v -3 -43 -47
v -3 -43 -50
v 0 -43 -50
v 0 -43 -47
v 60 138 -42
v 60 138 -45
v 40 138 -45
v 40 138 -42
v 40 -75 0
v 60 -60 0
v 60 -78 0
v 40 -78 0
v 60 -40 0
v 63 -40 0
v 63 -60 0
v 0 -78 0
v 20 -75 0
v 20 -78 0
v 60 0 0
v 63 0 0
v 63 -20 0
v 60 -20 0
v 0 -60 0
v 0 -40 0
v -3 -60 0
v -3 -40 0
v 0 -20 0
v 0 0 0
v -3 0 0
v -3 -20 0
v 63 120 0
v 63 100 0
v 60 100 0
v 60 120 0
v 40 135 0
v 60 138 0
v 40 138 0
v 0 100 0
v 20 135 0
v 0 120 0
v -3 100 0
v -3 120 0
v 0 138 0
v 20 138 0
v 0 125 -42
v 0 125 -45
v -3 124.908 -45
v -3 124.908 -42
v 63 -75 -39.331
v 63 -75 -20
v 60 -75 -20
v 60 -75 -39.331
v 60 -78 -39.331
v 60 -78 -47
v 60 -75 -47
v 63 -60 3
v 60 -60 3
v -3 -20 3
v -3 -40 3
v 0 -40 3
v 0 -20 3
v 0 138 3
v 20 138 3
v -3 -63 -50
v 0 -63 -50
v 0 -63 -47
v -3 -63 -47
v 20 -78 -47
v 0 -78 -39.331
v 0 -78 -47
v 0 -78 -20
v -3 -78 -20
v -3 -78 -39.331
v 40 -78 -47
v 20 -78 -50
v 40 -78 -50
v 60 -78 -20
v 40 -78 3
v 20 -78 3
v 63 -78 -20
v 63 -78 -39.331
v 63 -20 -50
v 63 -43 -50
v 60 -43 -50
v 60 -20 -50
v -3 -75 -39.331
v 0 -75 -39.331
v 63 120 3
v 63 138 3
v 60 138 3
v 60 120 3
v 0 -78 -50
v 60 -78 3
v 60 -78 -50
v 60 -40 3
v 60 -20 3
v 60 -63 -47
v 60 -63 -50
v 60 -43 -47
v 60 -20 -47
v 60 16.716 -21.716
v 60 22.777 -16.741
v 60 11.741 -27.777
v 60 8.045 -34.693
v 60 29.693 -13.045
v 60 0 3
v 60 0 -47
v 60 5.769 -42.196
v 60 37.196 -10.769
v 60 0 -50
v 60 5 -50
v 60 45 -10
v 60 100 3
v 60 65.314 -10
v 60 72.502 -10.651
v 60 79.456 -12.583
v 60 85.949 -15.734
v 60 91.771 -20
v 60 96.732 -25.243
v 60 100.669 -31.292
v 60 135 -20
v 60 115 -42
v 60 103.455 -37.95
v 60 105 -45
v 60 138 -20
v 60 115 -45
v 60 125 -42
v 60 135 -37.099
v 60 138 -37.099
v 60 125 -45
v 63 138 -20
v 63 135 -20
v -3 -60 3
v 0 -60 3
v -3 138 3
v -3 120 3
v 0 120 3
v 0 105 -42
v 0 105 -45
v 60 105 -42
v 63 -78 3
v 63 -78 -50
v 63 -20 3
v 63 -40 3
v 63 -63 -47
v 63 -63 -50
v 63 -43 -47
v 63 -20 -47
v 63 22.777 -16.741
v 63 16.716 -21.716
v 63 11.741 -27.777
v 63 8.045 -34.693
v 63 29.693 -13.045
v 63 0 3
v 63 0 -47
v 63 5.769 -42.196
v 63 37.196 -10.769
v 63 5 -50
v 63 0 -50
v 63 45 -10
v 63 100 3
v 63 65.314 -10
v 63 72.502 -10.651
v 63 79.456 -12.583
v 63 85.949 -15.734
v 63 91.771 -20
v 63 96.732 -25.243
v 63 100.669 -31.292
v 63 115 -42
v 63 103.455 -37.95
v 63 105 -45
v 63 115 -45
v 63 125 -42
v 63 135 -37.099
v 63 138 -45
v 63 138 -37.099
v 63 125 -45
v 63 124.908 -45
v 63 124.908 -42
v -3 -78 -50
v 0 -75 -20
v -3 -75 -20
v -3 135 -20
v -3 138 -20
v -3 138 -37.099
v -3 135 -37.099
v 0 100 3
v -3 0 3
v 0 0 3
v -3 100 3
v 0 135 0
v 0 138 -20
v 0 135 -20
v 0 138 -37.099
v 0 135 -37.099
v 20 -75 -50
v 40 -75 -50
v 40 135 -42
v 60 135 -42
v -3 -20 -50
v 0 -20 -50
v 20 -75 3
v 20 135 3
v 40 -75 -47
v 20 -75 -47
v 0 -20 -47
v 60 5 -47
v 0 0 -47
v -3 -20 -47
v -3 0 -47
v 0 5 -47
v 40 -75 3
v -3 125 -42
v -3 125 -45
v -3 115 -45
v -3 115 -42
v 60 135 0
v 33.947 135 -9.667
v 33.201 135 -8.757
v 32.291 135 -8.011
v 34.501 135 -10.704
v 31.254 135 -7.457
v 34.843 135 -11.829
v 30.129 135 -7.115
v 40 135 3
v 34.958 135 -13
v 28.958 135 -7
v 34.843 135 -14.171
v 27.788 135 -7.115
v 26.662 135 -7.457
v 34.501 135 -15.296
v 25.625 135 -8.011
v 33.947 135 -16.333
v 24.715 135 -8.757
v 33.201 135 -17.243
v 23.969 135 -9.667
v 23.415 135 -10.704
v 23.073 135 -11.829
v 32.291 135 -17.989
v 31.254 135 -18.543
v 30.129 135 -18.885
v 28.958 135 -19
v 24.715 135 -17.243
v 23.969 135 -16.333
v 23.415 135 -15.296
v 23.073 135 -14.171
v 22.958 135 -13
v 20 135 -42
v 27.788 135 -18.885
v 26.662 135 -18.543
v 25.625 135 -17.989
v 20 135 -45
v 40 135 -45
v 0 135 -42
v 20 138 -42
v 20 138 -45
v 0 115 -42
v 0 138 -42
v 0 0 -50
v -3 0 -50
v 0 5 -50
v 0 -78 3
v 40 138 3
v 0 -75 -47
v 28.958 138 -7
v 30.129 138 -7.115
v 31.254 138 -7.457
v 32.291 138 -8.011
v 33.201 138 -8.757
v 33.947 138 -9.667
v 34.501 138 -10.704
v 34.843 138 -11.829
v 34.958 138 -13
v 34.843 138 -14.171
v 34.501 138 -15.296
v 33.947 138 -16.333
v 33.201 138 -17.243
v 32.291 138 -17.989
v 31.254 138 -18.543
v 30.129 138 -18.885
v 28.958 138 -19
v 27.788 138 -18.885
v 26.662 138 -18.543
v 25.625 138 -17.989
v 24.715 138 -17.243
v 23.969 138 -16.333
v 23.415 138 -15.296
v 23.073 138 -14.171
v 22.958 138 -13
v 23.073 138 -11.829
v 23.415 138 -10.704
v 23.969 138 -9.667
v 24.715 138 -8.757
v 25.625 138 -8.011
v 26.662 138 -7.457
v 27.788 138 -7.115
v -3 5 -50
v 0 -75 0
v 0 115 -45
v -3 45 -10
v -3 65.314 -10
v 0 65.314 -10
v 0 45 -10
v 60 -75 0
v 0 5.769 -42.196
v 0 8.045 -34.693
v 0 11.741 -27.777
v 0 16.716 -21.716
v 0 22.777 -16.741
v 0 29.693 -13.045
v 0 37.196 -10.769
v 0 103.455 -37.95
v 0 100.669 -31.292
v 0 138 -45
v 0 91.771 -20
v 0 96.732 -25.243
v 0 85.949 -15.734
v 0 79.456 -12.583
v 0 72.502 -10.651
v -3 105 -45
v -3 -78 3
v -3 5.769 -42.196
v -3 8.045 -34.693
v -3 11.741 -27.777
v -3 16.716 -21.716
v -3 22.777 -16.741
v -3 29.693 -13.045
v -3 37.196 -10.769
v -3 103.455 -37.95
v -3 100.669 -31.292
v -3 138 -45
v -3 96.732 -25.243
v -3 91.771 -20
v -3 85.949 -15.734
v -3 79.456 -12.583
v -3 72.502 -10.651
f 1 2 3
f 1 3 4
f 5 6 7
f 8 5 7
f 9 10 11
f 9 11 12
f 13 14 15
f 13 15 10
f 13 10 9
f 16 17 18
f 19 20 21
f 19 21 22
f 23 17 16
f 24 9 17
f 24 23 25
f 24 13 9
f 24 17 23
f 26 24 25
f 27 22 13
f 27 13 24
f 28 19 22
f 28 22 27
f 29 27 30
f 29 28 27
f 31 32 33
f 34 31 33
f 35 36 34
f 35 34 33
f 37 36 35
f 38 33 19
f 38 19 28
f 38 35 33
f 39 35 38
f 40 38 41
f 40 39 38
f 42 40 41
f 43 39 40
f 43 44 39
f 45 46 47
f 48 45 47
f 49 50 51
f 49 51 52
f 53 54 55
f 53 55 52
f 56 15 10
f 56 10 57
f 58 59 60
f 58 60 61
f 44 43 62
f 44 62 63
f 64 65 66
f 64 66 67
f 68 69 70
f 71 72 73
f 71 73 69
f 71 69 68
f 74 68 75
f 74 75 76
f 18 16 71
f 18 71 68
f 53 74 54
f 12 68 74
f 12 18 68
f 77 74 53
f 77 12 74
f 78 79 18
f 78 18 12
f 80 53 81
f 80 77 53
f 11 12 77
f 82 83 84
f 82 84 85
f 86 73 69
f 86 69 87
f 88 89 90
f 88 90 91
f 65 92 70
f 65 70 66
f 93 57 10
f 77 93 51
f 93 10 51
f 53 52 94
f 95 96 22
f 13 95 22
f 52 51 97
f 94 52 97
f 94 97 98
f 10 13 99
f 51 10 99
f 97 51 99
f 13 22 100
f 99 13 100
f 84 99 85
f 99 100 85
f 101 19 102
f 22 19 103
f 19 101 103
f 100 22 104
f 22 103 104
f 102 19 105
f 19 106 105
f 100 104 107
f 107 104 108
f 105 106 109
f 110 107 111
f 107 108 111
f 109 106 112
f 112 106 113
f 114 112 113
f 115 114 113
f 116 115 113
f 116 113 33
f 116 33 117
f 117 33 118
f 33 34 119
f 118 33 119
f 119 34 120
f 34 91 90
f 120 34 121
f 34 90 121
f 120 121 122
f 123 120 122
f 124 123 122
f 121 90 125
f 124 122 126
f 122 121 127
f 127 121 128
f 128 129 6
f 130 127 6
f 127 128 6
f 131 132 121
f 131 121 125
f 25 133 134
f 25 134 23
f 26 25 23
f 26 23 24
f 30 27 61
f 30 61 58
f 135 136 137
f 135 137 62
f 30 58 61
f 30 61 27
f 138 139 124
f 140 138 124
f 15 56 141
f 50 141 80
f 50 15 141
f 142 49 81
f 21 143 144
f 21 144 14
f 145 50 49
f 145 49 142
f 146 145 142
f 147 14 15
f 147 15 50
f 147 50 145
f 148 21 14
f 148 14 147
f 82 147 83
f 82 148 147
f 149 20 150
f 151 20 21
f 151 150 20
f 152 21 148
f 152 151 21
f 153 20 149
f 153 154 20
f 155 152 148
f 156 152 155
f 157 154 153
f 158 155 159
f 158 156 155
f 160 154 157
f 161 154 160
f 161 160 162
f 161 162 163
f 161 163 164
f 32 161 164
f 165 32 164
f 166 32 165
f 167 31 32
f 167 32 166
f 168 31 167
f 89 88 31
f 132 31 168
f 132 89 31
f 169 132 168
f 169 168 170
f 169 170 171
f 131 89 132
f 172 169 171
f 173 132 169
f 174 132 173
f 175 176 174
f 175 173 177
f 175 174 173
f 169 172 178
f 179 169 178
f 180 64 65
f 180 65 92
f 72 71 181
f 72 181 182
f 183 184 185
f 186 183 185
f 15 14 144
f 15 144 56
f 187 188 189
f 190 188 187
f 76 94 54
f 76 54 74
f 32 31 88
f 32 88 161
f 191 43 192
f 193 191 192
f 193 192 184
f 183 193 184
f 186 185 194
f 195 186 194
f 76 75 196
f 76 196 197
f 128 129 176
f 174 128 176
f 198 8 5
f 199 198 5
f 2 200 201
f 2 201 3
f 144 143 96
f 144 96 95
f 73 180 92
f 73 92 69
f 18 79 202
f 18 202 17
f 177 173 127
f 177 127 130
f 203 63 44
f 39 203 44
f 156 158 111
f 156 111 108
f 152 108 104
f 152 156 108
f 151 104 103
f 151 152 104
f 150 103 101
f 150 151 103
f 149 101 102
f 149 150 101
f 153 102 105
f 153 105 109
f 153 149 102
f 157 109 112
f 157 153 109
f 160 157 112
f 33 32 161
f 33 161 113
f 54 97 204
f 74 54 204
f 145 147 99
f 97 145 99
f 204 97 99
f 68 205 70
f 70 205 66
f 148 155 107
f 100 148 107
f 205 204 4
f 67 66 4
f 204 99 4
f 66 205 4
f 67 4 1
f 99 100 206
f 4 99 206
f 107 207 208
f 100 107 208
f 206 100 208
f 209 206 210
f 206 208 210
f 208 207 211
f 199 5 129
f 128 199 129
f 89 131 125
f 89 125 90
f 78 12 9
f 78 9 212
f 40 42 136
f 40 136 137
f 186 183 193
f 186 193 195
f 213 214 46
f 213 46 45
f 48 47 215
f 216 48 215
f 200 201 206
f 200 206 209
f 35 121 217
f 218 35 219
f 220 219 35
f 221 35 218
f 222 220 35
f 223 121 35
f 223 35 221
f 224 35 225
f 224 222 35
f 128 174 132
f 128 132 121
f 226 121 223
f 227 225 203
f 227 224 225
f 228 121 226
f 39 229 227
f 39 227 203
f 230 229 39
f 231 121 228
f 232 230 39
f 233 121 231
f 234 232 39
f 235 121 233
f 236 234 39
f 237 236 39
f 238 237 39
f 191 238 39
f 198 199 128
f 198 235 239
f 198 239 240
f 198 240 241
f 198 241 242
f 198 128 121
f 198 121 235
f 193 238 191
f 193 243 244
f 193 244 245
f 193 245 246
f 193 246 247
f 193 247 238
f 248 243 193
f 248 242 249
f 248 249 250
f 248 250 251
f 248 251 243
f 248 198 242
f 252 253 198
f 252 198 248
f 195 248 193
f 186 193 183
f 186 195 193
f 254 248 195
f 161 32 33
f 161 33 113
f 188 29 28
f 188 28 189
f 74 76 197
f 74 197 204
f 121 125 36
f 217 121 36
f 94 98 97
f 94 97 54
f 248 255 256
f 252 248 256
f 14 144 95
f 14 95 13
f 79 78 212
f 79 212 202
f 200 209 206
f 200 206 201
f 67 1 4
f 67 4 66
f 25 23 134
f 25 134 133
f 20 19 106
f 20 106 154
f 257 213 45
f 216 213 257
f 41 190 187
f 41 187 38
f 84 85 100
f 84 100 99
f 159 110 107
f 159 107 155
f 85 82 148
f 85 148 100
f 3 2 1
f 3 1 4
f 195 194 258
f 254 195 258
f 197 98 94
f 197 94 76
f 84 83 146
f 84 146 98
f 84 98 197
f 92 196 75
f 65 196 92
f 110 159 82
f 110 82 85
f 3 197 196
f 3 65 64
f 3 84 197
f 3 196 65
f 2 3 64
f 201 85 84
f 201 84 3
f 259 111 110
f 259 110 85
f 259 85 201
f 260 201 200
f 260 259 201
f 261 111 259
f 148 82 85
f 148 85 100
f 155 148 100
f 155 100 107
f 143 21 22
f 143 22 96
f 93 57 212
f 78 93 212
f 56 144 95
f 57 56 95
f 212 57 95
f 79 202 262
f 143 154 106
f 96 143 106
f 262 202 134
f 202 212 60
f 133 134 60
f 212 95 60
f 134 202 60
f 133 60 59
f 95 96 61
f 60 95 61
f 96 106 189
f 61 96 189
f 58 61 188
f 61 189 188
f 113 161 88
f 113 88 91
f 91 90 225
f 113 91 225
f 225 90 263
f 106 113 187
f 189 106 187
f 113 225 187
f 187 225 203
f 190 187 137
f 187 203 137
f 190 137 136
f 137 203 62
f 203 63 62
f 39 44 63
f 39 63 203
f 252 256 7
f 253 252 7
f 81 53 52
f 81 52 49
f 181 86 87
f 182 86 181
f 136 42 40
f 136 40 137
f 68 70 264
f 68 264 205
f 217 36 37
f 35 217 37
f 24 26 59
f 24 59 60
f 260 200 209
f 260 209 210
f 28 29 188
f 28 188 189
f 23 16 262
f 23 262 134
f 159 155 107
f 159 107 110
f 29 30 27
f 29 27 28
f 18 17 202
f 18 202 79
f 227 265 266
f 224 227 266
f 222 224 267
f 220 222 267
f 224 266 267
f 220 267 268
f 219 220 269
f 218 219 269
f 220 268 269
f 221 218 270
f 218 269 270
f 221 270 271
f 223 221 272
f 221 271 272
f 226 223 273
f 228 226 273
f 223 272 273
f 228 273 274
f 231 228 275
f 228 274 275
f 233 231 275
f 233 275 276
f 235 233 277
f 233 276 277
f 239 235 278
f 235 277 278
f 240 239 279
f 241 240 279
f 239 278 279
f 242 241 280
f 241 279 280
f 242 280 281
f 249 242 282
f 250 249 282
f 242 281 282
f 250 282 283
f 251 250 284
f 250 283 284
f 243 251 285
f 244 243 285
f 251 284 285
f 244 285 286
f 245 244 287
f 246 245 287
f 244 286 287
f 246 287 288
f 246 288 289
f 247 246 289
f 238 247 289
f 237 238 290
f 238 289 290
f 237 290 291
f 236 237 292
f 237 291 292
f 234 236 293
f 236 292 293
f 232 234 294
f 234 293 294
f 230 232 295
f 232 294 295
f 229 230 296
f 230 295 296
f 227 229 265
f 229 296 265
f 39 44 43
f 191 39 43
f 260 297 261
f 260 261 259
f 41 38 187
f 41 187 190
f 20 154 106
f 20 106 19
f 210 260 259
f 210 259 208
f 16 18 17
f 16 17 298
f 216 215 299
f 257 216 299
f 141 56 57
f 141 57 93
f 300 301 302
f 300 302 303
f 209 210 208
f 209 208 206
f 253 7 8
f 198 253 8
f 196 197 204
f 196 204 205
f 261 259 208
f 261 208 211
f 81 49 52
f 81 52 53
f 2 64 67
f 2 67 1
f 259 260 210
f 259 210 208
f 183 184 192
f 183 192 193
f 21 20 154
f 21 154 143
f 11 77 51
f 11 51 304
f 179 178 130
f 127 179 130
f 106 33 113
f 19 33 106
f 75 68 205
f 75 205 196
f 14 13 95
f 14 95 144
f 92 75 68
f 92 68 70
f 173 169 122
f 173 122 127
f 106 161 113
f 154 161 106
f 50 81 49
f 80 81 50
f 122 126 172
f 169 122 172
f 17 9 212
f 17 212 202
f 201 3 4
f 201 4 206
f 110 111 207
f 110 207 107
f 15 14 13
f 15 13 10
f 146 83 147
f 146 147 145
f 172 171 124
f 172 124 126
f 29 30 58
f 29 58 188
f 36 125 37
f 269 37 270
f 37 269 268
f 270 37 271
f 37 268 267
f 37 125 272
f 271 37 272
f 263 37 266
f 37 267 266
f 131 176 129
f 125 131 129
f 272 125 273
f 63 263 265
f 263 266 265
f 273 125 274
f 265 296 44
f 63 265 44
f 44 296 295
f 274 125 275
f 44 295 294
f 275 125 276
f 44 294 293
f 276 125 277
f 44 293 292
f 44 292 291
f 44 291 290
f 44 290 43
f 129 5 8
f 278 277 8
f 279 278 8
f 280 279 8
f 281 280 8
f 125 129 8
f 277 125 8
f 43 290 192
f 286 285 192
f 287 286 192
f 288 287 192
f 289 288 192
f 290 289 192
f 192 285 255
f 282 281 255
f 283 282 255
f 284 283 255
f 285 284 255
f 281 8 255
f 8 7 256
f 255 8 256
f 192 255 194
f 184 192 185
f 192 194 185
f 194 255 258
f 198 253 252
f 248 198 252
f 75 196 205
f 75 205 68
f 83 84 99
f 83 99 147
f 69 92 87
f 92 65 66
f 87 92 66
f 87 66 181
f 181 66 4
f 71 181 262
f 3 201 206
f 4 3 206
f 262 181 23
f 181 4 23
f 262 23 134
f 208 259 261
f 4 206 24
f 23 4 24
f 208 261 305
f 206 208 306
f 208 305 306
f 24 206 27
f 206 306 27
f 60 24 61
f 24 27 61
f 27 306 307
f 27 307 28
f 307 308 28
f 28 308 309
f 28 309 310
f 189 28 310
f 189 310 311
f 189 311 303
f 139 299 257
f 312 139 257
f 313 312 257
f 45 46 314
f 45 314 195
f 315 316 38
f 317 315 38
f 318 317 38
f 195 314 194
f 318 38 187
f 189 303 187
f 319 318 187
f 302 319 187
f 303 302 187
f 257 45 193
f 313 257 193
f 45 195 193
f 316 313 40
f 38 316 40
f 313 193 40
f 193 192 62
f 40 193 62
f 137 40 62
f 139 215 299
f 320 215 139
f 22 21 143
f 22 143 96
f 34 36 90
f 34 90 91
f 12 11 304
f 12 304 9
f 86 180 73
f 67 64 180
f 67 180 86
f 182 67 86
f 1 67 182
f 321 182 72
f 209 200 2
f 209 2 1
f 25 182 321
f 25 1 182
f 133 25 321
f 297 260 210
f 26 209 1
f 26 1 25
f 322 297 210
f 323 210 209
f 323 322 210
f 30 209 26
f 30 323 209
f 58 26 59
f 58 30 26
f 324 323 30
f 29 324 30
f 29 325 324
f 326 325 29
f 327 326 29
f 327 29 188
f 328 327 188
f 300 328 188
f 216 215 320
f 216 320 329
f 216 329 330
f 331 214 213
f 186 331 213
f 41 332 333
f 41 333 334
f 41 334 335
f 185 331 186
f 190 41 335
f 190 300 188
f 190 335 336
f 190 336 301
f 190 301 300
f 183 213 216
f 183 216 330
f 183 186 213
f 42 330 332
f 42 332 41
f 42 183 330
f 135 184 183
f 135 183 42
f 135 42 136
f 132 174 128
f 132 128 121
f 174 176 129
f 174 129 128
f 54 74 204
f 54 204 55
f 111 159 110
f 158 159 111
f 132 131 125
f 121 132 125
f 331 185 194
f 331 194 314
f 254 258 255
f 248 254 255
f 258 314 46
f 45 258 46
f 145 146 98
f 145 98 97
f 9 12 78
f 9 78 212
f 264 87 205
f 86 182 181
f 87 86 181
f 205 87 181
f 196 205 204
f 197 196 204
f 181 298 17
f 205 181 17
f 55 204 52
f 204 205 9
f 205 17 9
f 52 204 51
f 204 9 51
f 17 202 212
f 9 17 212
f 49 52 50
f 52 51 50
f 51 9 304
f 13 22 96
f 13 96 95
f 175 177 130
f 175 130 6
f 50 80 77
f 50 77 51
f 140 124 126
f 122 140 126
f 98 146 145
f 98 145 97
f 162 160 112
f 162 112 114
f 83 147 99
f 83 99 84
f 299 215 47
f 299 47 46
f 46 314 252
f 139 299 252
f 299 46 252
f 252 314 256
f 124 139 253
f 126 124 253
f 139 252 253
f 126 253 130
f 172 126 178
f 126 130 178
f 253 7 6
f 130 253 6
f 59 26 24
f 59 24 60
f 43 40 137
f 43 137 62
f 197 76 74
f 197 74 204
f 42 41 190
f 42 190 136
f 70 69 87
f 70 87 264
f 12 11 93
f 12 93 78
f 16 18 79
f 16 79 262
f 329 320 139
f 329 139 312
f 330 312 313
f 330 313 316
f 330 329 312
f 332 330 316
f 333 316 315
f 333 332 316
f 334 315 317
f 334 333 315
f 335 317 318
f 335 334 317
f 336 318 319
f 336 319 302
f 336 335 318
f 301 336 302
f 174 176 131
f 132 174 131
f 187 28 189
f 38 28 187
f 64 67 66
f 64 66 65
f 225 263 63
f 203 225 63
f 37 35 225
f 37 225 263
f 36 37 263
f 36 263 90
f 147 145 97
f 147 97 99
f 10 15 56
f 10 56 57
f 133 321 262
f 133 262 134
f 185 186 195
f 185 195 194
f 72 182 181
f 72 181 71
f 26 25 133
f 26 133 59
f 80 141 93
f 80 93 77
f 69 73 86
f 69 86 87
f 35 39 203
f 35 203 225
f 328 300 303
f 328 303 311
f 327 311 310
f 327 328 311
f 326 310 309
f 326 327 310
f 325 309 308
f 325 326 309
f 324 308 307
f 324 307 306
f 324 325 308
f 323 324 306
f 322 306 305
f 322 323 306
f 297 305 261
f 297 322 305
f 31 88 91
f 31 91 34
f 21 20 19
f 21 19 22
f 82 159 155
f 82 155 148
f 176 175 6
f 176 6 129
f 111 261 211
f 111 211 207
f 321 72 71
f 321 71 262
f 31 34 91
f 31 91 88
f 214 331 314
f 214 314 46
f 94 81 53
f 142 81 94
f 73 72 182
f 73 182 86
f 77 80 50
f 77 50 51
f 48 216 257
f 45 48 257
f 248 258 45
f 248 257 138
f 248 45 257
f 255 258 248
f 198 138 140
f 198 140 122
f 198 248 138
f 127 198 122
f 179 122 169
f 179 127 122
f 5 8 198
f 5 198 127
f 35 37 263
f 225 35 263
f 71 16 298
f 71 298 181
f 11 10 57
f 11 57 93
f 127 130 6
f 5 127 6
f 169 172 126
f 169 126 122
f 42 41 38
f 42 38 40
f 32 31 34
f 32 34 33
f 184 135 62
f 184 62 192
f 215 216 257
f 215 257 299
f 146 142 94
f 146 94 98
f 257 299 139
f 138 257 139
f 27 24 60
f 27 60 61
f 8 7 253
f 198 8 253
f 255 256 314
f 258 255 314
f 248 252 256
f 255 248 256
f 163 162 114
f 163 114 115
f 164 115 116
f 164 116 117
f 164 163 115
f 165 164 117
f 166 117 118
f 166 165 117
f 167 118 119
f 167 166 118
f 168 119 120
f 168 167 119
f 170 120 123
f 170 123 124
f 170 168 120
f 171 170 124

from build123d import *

# Parameters (mm, degrees)
BOSS_EXTRUDE1_DEPTH = 3
BOSS_EXTRUDE2_DEPTH = 3
SKETCH3_R           = 6
BOSS_EXTRUDE3_DEPTH = 3
BOSS_EXTRUDE4_DEPTH = 3
BOSS_EXTRUDE5_DEPTH = 3
BOSS_EXTRUDE6_DEPTH = 3
BOSS_EXTRUDE8_DEPTH = 3


with BuildPart() as part:
    # Sketch1 → Boss-Extrude1 (new body)
    with BuildSketch(Plane.XY):
        Polygon((0, 0), (0, 100), (-3, 100), (-3, 120), (0, 120), (0, 138), (20, 138), (20, 135), (40, 135), (40, 138), (60, 138), (60, 120), (63, 120), (63, 100), (60, 100), (60, 0), (63, 0), (63, -20), (60, -20), (60, -40), (63, -40), (63, -60), (60, -60), (60, -78), (40, -78), (40, -75), (20, -75), (20, -78), (0, -78), (0, -60), (-3, -60), (-3, -40), (0, -40), (0, -20), (-3, -20), (-3, 0), align=None)
    extrude(amount=BOSS_EXTRUDE1_DEPTH)


with BuildPart() as body_2:
    # Sketch2 → Boss-Extrude2 (new body)
    with BuildSketch(Plane(origin=(63, 0, 0), x_dir=(0, 0, -1), z_dir=(1, 0, 0))):
        with BuildLine():
            Line((45, 138), (37.098973903, 138))
            Line((37.098973903, 138), (37.098973903, 135))
            Line((37.098973903, 135), (20, 135))
            Line((20, 135), (20, 138))
            Line((20, 138), (-3, 138))
            Line((-3, 138), (-3, 120))
            Line((-3, 120), (0, 120))
            Line((0, 120), (0, 100))
            Line((0, 100), (-3, 100))
            Line((-3, 100), (-3, 0))
            Line((-3, 0), (0, 0))
            Line((0, 0), (0, -20))
            Line((0, -20), (-3, -20))
            Line((-3, -20), (-3, -40))
            Line((-3, -40), (0, -40))
            Line((0, -40), (0, -60))
            Line((0, -60), (-3, -60))
            Line((-3, -60), (-3, -78))
            Line((-3, -78), (20, -78))
            Line((20, -78), (20, -75))
            Line((20, -75), (39.331188529, -75))
            Line((39.331188529, -75), (39.331188529, -78))
            Line((39.331188529, -78), (50, -78))
            Line((50, -78), (50, -63))
            Line((50, -63), (47, -63))
            Line((47, -63), (47, -43))
            Line((47, -43), (50, -43))
            Line((50, -43), (50, -20))
            Line((50, -20), (47, -20))
            Line((47, -20), (47, 0))
            Line((47, 0), (50, 0))
            Line((50, 0), (50, 5))
            ThreePointArc((50, 5), (21.715728753, 16.715728753), (10, 45))
            Line((10, 45), (10, 65.313730334))
            ThreePointArc((10, 65.313730334), (20, 91.771243445), (45, 105))
            Line((45, 105), (45, 115))
            Line((45, 115), (42, 115))
            Line((42, 115), (42, 125))
            Line((42, 125), (45, 125))
            Line((45, 125), (45, 138))
        make_face()
    extrude(amount=-BOSS_EXTRUDE2_DEPTH)


with BuildPart() as body_3:
    # Sketch3 → Boss-Extrude3 (new body)
    with BuildSketch(Plane(origin=(0, 138, 0), x_dir=(1, 0, 0), z_dir=(0, 1, 0))):
        Polygon((60, 37.098973903), (63, 37.098973903), (63, 20), (60, 20), (60, 0), (40, 0), (40, -3), (20, -3), (20, 0), (0, 0), (0, 20), (-3, 20), (-3, 37.098973903), (0, 37.098973903), (0, 42), (20, 42), (20, 45), (40, 45), (40, 42), (60, 42), align=None)
        with Locations(Location((28.958057159, 13, 0), (0, 0, 270))):
            Circle(SKETCH3_R, mode=Mode.SUBTRACT)
    extrude(amount=-BOSS_EXTRUDE3_DEPTH)


with BuildPart() as body_4:
    # Sketch4 → Boss-Extrude4 (new body)
    with BuildSketch(Plane(origin=(0, 0, -45), x_dir=(-1, 0, 0), z_dir=(0, 0, -1))):
        Polygon((-63, 124.908408672), (-60, 125), (-60, 138), (-40, 138), (-40, 135), (-20, 135), (-20, 138), (0, 138), (0, 125), (3, 124.908408672), (3, 115), (0, 115), (0, 105), (-60, 105), (-60, 115), (-63, 115), align=None)
    extrude(amount=-BOSS_EXTRUDE4_DEPTH)


with BuildPart() as body_5:
    # Sketch5 → Boss-Extrude5 (new body)
    with BuildSketch(Plane(origin=(0, 0, -50), x_dir=(-1, 0, 0), z_dir=(0, 0, -1))):
        Polygon((-60, 5), (-60, 0), (-63, 0), (-63, -20), (-60, -20), (-60, -43), (-63, -43), (-63, -63), (-60, -63), (-60, -78), (-40, -78), (-40, -75), (-20, -75), (-20, -78), (0, -78), (0, -63), (3, -63), (3, -43), (0, -43), (0, -20), (3, -20), (3, 0), (0, 0), (0, 5), align=None)
    extrude(amount=-BOSS_EXTRUDE5_DEPTH)


with BuildPart() as body_6:
    # Sketch6 → Boss-Extrude6 (new body)
    with BuildSketch(Plane.XZ.offset(78)):
        Polygon((40, -50), (40, -47), (60, -47), (60, -39.331188529), (63, -39.331188529), (63, -20), (60, -20), (60, 0), (40, 0), (40, 3), (20, 3), (20, 0), (0, 0), (0, -20), (-3, -20), (-3, -39.331188529), (0, -39.331188529), (0, -47), (20, -47), (20, -50), align=None)
    extrude(amount=-BOSS_EXTRUDE6_DEPTH)


with BuildPart() as body_7:
    # Sketch7 → Boss-Extrude8 (new body)
    with BuildSketch(Plane.ZY.offset(3)):
        with BuildLine():
            Line((3, 138), (-20, 138))
            Line((-20, 138), (-20, 135))
            Line((-20, 135), (-37.098973903, 135))
            Line((-37.098973903, 135), (-37.098973903, 138))
            Line((-37.098973903, 138), (-45, 138))
            Line((-45, 138), (-45, 125))
            Line((-45, 125), (-42, 125))
            Line((-42, 125), (-42, 115))
            Line((-42, 115), (-45, 115))
            Line((-45, 115), (-45, 105))
            ThreePointArc((-45, 105), (-20, 91.771243445), (-10, 65.313730334))
            Line((-10, 65.313730334), (-10, 45))
            ThreePointArc((-10, 45), (-21.715728753, 16.715728753), (-50, 5))
            Line((-50, 5), (-50, 0))
            Line((-50, 0), (-47, 0))
            Line((-47, 0), (-47, -20))
            Line((-47, -20), (-50, -20))
            Line((-50, -20), (-50, -43))
            Line((-50, -43), (-47, -43))
            Line((-47, -43), (-47, -63))
            Line((-47, -63), (-50, -63))
            Line((-50, -63), (-50, -78))
            Line((-50, -78), (-39.331188529, -78))
            Line((-39.331188529, -78), (-39.331188529, -75))
            Line((-39.331188529, -75), (-20, -75))
            Line((-20, -75), (-20, -78))
            Line((-20, -78), (3, -78))
            Line((3, -78), (3, -60))
            Line((3, -60), (0, -60))
            Line((0, -60), (0, -40))
            Line((0, -40), (3, -40))
            Line((3, -40), (3, -20))
            Line((3, -20), (0, -20))
            Line((0, -20), (0, 0))
            Line((0, 0), (3, 0))
            Line((3, 0), (3, 100))
            Line((3, 100), (0, 100))
            Line((0, 100), (0, 120))
            Line((0, 120), (3, 120))
            Line((3, 120), (3, 138))
        make_face()
    extrude(amount=-BOSS_EXTRUDE8_DEPTH)


solid = Compound([part.part, body_2.part, body_3.part, body_4.part, body_5.part, body_6.part, body_7.part])
